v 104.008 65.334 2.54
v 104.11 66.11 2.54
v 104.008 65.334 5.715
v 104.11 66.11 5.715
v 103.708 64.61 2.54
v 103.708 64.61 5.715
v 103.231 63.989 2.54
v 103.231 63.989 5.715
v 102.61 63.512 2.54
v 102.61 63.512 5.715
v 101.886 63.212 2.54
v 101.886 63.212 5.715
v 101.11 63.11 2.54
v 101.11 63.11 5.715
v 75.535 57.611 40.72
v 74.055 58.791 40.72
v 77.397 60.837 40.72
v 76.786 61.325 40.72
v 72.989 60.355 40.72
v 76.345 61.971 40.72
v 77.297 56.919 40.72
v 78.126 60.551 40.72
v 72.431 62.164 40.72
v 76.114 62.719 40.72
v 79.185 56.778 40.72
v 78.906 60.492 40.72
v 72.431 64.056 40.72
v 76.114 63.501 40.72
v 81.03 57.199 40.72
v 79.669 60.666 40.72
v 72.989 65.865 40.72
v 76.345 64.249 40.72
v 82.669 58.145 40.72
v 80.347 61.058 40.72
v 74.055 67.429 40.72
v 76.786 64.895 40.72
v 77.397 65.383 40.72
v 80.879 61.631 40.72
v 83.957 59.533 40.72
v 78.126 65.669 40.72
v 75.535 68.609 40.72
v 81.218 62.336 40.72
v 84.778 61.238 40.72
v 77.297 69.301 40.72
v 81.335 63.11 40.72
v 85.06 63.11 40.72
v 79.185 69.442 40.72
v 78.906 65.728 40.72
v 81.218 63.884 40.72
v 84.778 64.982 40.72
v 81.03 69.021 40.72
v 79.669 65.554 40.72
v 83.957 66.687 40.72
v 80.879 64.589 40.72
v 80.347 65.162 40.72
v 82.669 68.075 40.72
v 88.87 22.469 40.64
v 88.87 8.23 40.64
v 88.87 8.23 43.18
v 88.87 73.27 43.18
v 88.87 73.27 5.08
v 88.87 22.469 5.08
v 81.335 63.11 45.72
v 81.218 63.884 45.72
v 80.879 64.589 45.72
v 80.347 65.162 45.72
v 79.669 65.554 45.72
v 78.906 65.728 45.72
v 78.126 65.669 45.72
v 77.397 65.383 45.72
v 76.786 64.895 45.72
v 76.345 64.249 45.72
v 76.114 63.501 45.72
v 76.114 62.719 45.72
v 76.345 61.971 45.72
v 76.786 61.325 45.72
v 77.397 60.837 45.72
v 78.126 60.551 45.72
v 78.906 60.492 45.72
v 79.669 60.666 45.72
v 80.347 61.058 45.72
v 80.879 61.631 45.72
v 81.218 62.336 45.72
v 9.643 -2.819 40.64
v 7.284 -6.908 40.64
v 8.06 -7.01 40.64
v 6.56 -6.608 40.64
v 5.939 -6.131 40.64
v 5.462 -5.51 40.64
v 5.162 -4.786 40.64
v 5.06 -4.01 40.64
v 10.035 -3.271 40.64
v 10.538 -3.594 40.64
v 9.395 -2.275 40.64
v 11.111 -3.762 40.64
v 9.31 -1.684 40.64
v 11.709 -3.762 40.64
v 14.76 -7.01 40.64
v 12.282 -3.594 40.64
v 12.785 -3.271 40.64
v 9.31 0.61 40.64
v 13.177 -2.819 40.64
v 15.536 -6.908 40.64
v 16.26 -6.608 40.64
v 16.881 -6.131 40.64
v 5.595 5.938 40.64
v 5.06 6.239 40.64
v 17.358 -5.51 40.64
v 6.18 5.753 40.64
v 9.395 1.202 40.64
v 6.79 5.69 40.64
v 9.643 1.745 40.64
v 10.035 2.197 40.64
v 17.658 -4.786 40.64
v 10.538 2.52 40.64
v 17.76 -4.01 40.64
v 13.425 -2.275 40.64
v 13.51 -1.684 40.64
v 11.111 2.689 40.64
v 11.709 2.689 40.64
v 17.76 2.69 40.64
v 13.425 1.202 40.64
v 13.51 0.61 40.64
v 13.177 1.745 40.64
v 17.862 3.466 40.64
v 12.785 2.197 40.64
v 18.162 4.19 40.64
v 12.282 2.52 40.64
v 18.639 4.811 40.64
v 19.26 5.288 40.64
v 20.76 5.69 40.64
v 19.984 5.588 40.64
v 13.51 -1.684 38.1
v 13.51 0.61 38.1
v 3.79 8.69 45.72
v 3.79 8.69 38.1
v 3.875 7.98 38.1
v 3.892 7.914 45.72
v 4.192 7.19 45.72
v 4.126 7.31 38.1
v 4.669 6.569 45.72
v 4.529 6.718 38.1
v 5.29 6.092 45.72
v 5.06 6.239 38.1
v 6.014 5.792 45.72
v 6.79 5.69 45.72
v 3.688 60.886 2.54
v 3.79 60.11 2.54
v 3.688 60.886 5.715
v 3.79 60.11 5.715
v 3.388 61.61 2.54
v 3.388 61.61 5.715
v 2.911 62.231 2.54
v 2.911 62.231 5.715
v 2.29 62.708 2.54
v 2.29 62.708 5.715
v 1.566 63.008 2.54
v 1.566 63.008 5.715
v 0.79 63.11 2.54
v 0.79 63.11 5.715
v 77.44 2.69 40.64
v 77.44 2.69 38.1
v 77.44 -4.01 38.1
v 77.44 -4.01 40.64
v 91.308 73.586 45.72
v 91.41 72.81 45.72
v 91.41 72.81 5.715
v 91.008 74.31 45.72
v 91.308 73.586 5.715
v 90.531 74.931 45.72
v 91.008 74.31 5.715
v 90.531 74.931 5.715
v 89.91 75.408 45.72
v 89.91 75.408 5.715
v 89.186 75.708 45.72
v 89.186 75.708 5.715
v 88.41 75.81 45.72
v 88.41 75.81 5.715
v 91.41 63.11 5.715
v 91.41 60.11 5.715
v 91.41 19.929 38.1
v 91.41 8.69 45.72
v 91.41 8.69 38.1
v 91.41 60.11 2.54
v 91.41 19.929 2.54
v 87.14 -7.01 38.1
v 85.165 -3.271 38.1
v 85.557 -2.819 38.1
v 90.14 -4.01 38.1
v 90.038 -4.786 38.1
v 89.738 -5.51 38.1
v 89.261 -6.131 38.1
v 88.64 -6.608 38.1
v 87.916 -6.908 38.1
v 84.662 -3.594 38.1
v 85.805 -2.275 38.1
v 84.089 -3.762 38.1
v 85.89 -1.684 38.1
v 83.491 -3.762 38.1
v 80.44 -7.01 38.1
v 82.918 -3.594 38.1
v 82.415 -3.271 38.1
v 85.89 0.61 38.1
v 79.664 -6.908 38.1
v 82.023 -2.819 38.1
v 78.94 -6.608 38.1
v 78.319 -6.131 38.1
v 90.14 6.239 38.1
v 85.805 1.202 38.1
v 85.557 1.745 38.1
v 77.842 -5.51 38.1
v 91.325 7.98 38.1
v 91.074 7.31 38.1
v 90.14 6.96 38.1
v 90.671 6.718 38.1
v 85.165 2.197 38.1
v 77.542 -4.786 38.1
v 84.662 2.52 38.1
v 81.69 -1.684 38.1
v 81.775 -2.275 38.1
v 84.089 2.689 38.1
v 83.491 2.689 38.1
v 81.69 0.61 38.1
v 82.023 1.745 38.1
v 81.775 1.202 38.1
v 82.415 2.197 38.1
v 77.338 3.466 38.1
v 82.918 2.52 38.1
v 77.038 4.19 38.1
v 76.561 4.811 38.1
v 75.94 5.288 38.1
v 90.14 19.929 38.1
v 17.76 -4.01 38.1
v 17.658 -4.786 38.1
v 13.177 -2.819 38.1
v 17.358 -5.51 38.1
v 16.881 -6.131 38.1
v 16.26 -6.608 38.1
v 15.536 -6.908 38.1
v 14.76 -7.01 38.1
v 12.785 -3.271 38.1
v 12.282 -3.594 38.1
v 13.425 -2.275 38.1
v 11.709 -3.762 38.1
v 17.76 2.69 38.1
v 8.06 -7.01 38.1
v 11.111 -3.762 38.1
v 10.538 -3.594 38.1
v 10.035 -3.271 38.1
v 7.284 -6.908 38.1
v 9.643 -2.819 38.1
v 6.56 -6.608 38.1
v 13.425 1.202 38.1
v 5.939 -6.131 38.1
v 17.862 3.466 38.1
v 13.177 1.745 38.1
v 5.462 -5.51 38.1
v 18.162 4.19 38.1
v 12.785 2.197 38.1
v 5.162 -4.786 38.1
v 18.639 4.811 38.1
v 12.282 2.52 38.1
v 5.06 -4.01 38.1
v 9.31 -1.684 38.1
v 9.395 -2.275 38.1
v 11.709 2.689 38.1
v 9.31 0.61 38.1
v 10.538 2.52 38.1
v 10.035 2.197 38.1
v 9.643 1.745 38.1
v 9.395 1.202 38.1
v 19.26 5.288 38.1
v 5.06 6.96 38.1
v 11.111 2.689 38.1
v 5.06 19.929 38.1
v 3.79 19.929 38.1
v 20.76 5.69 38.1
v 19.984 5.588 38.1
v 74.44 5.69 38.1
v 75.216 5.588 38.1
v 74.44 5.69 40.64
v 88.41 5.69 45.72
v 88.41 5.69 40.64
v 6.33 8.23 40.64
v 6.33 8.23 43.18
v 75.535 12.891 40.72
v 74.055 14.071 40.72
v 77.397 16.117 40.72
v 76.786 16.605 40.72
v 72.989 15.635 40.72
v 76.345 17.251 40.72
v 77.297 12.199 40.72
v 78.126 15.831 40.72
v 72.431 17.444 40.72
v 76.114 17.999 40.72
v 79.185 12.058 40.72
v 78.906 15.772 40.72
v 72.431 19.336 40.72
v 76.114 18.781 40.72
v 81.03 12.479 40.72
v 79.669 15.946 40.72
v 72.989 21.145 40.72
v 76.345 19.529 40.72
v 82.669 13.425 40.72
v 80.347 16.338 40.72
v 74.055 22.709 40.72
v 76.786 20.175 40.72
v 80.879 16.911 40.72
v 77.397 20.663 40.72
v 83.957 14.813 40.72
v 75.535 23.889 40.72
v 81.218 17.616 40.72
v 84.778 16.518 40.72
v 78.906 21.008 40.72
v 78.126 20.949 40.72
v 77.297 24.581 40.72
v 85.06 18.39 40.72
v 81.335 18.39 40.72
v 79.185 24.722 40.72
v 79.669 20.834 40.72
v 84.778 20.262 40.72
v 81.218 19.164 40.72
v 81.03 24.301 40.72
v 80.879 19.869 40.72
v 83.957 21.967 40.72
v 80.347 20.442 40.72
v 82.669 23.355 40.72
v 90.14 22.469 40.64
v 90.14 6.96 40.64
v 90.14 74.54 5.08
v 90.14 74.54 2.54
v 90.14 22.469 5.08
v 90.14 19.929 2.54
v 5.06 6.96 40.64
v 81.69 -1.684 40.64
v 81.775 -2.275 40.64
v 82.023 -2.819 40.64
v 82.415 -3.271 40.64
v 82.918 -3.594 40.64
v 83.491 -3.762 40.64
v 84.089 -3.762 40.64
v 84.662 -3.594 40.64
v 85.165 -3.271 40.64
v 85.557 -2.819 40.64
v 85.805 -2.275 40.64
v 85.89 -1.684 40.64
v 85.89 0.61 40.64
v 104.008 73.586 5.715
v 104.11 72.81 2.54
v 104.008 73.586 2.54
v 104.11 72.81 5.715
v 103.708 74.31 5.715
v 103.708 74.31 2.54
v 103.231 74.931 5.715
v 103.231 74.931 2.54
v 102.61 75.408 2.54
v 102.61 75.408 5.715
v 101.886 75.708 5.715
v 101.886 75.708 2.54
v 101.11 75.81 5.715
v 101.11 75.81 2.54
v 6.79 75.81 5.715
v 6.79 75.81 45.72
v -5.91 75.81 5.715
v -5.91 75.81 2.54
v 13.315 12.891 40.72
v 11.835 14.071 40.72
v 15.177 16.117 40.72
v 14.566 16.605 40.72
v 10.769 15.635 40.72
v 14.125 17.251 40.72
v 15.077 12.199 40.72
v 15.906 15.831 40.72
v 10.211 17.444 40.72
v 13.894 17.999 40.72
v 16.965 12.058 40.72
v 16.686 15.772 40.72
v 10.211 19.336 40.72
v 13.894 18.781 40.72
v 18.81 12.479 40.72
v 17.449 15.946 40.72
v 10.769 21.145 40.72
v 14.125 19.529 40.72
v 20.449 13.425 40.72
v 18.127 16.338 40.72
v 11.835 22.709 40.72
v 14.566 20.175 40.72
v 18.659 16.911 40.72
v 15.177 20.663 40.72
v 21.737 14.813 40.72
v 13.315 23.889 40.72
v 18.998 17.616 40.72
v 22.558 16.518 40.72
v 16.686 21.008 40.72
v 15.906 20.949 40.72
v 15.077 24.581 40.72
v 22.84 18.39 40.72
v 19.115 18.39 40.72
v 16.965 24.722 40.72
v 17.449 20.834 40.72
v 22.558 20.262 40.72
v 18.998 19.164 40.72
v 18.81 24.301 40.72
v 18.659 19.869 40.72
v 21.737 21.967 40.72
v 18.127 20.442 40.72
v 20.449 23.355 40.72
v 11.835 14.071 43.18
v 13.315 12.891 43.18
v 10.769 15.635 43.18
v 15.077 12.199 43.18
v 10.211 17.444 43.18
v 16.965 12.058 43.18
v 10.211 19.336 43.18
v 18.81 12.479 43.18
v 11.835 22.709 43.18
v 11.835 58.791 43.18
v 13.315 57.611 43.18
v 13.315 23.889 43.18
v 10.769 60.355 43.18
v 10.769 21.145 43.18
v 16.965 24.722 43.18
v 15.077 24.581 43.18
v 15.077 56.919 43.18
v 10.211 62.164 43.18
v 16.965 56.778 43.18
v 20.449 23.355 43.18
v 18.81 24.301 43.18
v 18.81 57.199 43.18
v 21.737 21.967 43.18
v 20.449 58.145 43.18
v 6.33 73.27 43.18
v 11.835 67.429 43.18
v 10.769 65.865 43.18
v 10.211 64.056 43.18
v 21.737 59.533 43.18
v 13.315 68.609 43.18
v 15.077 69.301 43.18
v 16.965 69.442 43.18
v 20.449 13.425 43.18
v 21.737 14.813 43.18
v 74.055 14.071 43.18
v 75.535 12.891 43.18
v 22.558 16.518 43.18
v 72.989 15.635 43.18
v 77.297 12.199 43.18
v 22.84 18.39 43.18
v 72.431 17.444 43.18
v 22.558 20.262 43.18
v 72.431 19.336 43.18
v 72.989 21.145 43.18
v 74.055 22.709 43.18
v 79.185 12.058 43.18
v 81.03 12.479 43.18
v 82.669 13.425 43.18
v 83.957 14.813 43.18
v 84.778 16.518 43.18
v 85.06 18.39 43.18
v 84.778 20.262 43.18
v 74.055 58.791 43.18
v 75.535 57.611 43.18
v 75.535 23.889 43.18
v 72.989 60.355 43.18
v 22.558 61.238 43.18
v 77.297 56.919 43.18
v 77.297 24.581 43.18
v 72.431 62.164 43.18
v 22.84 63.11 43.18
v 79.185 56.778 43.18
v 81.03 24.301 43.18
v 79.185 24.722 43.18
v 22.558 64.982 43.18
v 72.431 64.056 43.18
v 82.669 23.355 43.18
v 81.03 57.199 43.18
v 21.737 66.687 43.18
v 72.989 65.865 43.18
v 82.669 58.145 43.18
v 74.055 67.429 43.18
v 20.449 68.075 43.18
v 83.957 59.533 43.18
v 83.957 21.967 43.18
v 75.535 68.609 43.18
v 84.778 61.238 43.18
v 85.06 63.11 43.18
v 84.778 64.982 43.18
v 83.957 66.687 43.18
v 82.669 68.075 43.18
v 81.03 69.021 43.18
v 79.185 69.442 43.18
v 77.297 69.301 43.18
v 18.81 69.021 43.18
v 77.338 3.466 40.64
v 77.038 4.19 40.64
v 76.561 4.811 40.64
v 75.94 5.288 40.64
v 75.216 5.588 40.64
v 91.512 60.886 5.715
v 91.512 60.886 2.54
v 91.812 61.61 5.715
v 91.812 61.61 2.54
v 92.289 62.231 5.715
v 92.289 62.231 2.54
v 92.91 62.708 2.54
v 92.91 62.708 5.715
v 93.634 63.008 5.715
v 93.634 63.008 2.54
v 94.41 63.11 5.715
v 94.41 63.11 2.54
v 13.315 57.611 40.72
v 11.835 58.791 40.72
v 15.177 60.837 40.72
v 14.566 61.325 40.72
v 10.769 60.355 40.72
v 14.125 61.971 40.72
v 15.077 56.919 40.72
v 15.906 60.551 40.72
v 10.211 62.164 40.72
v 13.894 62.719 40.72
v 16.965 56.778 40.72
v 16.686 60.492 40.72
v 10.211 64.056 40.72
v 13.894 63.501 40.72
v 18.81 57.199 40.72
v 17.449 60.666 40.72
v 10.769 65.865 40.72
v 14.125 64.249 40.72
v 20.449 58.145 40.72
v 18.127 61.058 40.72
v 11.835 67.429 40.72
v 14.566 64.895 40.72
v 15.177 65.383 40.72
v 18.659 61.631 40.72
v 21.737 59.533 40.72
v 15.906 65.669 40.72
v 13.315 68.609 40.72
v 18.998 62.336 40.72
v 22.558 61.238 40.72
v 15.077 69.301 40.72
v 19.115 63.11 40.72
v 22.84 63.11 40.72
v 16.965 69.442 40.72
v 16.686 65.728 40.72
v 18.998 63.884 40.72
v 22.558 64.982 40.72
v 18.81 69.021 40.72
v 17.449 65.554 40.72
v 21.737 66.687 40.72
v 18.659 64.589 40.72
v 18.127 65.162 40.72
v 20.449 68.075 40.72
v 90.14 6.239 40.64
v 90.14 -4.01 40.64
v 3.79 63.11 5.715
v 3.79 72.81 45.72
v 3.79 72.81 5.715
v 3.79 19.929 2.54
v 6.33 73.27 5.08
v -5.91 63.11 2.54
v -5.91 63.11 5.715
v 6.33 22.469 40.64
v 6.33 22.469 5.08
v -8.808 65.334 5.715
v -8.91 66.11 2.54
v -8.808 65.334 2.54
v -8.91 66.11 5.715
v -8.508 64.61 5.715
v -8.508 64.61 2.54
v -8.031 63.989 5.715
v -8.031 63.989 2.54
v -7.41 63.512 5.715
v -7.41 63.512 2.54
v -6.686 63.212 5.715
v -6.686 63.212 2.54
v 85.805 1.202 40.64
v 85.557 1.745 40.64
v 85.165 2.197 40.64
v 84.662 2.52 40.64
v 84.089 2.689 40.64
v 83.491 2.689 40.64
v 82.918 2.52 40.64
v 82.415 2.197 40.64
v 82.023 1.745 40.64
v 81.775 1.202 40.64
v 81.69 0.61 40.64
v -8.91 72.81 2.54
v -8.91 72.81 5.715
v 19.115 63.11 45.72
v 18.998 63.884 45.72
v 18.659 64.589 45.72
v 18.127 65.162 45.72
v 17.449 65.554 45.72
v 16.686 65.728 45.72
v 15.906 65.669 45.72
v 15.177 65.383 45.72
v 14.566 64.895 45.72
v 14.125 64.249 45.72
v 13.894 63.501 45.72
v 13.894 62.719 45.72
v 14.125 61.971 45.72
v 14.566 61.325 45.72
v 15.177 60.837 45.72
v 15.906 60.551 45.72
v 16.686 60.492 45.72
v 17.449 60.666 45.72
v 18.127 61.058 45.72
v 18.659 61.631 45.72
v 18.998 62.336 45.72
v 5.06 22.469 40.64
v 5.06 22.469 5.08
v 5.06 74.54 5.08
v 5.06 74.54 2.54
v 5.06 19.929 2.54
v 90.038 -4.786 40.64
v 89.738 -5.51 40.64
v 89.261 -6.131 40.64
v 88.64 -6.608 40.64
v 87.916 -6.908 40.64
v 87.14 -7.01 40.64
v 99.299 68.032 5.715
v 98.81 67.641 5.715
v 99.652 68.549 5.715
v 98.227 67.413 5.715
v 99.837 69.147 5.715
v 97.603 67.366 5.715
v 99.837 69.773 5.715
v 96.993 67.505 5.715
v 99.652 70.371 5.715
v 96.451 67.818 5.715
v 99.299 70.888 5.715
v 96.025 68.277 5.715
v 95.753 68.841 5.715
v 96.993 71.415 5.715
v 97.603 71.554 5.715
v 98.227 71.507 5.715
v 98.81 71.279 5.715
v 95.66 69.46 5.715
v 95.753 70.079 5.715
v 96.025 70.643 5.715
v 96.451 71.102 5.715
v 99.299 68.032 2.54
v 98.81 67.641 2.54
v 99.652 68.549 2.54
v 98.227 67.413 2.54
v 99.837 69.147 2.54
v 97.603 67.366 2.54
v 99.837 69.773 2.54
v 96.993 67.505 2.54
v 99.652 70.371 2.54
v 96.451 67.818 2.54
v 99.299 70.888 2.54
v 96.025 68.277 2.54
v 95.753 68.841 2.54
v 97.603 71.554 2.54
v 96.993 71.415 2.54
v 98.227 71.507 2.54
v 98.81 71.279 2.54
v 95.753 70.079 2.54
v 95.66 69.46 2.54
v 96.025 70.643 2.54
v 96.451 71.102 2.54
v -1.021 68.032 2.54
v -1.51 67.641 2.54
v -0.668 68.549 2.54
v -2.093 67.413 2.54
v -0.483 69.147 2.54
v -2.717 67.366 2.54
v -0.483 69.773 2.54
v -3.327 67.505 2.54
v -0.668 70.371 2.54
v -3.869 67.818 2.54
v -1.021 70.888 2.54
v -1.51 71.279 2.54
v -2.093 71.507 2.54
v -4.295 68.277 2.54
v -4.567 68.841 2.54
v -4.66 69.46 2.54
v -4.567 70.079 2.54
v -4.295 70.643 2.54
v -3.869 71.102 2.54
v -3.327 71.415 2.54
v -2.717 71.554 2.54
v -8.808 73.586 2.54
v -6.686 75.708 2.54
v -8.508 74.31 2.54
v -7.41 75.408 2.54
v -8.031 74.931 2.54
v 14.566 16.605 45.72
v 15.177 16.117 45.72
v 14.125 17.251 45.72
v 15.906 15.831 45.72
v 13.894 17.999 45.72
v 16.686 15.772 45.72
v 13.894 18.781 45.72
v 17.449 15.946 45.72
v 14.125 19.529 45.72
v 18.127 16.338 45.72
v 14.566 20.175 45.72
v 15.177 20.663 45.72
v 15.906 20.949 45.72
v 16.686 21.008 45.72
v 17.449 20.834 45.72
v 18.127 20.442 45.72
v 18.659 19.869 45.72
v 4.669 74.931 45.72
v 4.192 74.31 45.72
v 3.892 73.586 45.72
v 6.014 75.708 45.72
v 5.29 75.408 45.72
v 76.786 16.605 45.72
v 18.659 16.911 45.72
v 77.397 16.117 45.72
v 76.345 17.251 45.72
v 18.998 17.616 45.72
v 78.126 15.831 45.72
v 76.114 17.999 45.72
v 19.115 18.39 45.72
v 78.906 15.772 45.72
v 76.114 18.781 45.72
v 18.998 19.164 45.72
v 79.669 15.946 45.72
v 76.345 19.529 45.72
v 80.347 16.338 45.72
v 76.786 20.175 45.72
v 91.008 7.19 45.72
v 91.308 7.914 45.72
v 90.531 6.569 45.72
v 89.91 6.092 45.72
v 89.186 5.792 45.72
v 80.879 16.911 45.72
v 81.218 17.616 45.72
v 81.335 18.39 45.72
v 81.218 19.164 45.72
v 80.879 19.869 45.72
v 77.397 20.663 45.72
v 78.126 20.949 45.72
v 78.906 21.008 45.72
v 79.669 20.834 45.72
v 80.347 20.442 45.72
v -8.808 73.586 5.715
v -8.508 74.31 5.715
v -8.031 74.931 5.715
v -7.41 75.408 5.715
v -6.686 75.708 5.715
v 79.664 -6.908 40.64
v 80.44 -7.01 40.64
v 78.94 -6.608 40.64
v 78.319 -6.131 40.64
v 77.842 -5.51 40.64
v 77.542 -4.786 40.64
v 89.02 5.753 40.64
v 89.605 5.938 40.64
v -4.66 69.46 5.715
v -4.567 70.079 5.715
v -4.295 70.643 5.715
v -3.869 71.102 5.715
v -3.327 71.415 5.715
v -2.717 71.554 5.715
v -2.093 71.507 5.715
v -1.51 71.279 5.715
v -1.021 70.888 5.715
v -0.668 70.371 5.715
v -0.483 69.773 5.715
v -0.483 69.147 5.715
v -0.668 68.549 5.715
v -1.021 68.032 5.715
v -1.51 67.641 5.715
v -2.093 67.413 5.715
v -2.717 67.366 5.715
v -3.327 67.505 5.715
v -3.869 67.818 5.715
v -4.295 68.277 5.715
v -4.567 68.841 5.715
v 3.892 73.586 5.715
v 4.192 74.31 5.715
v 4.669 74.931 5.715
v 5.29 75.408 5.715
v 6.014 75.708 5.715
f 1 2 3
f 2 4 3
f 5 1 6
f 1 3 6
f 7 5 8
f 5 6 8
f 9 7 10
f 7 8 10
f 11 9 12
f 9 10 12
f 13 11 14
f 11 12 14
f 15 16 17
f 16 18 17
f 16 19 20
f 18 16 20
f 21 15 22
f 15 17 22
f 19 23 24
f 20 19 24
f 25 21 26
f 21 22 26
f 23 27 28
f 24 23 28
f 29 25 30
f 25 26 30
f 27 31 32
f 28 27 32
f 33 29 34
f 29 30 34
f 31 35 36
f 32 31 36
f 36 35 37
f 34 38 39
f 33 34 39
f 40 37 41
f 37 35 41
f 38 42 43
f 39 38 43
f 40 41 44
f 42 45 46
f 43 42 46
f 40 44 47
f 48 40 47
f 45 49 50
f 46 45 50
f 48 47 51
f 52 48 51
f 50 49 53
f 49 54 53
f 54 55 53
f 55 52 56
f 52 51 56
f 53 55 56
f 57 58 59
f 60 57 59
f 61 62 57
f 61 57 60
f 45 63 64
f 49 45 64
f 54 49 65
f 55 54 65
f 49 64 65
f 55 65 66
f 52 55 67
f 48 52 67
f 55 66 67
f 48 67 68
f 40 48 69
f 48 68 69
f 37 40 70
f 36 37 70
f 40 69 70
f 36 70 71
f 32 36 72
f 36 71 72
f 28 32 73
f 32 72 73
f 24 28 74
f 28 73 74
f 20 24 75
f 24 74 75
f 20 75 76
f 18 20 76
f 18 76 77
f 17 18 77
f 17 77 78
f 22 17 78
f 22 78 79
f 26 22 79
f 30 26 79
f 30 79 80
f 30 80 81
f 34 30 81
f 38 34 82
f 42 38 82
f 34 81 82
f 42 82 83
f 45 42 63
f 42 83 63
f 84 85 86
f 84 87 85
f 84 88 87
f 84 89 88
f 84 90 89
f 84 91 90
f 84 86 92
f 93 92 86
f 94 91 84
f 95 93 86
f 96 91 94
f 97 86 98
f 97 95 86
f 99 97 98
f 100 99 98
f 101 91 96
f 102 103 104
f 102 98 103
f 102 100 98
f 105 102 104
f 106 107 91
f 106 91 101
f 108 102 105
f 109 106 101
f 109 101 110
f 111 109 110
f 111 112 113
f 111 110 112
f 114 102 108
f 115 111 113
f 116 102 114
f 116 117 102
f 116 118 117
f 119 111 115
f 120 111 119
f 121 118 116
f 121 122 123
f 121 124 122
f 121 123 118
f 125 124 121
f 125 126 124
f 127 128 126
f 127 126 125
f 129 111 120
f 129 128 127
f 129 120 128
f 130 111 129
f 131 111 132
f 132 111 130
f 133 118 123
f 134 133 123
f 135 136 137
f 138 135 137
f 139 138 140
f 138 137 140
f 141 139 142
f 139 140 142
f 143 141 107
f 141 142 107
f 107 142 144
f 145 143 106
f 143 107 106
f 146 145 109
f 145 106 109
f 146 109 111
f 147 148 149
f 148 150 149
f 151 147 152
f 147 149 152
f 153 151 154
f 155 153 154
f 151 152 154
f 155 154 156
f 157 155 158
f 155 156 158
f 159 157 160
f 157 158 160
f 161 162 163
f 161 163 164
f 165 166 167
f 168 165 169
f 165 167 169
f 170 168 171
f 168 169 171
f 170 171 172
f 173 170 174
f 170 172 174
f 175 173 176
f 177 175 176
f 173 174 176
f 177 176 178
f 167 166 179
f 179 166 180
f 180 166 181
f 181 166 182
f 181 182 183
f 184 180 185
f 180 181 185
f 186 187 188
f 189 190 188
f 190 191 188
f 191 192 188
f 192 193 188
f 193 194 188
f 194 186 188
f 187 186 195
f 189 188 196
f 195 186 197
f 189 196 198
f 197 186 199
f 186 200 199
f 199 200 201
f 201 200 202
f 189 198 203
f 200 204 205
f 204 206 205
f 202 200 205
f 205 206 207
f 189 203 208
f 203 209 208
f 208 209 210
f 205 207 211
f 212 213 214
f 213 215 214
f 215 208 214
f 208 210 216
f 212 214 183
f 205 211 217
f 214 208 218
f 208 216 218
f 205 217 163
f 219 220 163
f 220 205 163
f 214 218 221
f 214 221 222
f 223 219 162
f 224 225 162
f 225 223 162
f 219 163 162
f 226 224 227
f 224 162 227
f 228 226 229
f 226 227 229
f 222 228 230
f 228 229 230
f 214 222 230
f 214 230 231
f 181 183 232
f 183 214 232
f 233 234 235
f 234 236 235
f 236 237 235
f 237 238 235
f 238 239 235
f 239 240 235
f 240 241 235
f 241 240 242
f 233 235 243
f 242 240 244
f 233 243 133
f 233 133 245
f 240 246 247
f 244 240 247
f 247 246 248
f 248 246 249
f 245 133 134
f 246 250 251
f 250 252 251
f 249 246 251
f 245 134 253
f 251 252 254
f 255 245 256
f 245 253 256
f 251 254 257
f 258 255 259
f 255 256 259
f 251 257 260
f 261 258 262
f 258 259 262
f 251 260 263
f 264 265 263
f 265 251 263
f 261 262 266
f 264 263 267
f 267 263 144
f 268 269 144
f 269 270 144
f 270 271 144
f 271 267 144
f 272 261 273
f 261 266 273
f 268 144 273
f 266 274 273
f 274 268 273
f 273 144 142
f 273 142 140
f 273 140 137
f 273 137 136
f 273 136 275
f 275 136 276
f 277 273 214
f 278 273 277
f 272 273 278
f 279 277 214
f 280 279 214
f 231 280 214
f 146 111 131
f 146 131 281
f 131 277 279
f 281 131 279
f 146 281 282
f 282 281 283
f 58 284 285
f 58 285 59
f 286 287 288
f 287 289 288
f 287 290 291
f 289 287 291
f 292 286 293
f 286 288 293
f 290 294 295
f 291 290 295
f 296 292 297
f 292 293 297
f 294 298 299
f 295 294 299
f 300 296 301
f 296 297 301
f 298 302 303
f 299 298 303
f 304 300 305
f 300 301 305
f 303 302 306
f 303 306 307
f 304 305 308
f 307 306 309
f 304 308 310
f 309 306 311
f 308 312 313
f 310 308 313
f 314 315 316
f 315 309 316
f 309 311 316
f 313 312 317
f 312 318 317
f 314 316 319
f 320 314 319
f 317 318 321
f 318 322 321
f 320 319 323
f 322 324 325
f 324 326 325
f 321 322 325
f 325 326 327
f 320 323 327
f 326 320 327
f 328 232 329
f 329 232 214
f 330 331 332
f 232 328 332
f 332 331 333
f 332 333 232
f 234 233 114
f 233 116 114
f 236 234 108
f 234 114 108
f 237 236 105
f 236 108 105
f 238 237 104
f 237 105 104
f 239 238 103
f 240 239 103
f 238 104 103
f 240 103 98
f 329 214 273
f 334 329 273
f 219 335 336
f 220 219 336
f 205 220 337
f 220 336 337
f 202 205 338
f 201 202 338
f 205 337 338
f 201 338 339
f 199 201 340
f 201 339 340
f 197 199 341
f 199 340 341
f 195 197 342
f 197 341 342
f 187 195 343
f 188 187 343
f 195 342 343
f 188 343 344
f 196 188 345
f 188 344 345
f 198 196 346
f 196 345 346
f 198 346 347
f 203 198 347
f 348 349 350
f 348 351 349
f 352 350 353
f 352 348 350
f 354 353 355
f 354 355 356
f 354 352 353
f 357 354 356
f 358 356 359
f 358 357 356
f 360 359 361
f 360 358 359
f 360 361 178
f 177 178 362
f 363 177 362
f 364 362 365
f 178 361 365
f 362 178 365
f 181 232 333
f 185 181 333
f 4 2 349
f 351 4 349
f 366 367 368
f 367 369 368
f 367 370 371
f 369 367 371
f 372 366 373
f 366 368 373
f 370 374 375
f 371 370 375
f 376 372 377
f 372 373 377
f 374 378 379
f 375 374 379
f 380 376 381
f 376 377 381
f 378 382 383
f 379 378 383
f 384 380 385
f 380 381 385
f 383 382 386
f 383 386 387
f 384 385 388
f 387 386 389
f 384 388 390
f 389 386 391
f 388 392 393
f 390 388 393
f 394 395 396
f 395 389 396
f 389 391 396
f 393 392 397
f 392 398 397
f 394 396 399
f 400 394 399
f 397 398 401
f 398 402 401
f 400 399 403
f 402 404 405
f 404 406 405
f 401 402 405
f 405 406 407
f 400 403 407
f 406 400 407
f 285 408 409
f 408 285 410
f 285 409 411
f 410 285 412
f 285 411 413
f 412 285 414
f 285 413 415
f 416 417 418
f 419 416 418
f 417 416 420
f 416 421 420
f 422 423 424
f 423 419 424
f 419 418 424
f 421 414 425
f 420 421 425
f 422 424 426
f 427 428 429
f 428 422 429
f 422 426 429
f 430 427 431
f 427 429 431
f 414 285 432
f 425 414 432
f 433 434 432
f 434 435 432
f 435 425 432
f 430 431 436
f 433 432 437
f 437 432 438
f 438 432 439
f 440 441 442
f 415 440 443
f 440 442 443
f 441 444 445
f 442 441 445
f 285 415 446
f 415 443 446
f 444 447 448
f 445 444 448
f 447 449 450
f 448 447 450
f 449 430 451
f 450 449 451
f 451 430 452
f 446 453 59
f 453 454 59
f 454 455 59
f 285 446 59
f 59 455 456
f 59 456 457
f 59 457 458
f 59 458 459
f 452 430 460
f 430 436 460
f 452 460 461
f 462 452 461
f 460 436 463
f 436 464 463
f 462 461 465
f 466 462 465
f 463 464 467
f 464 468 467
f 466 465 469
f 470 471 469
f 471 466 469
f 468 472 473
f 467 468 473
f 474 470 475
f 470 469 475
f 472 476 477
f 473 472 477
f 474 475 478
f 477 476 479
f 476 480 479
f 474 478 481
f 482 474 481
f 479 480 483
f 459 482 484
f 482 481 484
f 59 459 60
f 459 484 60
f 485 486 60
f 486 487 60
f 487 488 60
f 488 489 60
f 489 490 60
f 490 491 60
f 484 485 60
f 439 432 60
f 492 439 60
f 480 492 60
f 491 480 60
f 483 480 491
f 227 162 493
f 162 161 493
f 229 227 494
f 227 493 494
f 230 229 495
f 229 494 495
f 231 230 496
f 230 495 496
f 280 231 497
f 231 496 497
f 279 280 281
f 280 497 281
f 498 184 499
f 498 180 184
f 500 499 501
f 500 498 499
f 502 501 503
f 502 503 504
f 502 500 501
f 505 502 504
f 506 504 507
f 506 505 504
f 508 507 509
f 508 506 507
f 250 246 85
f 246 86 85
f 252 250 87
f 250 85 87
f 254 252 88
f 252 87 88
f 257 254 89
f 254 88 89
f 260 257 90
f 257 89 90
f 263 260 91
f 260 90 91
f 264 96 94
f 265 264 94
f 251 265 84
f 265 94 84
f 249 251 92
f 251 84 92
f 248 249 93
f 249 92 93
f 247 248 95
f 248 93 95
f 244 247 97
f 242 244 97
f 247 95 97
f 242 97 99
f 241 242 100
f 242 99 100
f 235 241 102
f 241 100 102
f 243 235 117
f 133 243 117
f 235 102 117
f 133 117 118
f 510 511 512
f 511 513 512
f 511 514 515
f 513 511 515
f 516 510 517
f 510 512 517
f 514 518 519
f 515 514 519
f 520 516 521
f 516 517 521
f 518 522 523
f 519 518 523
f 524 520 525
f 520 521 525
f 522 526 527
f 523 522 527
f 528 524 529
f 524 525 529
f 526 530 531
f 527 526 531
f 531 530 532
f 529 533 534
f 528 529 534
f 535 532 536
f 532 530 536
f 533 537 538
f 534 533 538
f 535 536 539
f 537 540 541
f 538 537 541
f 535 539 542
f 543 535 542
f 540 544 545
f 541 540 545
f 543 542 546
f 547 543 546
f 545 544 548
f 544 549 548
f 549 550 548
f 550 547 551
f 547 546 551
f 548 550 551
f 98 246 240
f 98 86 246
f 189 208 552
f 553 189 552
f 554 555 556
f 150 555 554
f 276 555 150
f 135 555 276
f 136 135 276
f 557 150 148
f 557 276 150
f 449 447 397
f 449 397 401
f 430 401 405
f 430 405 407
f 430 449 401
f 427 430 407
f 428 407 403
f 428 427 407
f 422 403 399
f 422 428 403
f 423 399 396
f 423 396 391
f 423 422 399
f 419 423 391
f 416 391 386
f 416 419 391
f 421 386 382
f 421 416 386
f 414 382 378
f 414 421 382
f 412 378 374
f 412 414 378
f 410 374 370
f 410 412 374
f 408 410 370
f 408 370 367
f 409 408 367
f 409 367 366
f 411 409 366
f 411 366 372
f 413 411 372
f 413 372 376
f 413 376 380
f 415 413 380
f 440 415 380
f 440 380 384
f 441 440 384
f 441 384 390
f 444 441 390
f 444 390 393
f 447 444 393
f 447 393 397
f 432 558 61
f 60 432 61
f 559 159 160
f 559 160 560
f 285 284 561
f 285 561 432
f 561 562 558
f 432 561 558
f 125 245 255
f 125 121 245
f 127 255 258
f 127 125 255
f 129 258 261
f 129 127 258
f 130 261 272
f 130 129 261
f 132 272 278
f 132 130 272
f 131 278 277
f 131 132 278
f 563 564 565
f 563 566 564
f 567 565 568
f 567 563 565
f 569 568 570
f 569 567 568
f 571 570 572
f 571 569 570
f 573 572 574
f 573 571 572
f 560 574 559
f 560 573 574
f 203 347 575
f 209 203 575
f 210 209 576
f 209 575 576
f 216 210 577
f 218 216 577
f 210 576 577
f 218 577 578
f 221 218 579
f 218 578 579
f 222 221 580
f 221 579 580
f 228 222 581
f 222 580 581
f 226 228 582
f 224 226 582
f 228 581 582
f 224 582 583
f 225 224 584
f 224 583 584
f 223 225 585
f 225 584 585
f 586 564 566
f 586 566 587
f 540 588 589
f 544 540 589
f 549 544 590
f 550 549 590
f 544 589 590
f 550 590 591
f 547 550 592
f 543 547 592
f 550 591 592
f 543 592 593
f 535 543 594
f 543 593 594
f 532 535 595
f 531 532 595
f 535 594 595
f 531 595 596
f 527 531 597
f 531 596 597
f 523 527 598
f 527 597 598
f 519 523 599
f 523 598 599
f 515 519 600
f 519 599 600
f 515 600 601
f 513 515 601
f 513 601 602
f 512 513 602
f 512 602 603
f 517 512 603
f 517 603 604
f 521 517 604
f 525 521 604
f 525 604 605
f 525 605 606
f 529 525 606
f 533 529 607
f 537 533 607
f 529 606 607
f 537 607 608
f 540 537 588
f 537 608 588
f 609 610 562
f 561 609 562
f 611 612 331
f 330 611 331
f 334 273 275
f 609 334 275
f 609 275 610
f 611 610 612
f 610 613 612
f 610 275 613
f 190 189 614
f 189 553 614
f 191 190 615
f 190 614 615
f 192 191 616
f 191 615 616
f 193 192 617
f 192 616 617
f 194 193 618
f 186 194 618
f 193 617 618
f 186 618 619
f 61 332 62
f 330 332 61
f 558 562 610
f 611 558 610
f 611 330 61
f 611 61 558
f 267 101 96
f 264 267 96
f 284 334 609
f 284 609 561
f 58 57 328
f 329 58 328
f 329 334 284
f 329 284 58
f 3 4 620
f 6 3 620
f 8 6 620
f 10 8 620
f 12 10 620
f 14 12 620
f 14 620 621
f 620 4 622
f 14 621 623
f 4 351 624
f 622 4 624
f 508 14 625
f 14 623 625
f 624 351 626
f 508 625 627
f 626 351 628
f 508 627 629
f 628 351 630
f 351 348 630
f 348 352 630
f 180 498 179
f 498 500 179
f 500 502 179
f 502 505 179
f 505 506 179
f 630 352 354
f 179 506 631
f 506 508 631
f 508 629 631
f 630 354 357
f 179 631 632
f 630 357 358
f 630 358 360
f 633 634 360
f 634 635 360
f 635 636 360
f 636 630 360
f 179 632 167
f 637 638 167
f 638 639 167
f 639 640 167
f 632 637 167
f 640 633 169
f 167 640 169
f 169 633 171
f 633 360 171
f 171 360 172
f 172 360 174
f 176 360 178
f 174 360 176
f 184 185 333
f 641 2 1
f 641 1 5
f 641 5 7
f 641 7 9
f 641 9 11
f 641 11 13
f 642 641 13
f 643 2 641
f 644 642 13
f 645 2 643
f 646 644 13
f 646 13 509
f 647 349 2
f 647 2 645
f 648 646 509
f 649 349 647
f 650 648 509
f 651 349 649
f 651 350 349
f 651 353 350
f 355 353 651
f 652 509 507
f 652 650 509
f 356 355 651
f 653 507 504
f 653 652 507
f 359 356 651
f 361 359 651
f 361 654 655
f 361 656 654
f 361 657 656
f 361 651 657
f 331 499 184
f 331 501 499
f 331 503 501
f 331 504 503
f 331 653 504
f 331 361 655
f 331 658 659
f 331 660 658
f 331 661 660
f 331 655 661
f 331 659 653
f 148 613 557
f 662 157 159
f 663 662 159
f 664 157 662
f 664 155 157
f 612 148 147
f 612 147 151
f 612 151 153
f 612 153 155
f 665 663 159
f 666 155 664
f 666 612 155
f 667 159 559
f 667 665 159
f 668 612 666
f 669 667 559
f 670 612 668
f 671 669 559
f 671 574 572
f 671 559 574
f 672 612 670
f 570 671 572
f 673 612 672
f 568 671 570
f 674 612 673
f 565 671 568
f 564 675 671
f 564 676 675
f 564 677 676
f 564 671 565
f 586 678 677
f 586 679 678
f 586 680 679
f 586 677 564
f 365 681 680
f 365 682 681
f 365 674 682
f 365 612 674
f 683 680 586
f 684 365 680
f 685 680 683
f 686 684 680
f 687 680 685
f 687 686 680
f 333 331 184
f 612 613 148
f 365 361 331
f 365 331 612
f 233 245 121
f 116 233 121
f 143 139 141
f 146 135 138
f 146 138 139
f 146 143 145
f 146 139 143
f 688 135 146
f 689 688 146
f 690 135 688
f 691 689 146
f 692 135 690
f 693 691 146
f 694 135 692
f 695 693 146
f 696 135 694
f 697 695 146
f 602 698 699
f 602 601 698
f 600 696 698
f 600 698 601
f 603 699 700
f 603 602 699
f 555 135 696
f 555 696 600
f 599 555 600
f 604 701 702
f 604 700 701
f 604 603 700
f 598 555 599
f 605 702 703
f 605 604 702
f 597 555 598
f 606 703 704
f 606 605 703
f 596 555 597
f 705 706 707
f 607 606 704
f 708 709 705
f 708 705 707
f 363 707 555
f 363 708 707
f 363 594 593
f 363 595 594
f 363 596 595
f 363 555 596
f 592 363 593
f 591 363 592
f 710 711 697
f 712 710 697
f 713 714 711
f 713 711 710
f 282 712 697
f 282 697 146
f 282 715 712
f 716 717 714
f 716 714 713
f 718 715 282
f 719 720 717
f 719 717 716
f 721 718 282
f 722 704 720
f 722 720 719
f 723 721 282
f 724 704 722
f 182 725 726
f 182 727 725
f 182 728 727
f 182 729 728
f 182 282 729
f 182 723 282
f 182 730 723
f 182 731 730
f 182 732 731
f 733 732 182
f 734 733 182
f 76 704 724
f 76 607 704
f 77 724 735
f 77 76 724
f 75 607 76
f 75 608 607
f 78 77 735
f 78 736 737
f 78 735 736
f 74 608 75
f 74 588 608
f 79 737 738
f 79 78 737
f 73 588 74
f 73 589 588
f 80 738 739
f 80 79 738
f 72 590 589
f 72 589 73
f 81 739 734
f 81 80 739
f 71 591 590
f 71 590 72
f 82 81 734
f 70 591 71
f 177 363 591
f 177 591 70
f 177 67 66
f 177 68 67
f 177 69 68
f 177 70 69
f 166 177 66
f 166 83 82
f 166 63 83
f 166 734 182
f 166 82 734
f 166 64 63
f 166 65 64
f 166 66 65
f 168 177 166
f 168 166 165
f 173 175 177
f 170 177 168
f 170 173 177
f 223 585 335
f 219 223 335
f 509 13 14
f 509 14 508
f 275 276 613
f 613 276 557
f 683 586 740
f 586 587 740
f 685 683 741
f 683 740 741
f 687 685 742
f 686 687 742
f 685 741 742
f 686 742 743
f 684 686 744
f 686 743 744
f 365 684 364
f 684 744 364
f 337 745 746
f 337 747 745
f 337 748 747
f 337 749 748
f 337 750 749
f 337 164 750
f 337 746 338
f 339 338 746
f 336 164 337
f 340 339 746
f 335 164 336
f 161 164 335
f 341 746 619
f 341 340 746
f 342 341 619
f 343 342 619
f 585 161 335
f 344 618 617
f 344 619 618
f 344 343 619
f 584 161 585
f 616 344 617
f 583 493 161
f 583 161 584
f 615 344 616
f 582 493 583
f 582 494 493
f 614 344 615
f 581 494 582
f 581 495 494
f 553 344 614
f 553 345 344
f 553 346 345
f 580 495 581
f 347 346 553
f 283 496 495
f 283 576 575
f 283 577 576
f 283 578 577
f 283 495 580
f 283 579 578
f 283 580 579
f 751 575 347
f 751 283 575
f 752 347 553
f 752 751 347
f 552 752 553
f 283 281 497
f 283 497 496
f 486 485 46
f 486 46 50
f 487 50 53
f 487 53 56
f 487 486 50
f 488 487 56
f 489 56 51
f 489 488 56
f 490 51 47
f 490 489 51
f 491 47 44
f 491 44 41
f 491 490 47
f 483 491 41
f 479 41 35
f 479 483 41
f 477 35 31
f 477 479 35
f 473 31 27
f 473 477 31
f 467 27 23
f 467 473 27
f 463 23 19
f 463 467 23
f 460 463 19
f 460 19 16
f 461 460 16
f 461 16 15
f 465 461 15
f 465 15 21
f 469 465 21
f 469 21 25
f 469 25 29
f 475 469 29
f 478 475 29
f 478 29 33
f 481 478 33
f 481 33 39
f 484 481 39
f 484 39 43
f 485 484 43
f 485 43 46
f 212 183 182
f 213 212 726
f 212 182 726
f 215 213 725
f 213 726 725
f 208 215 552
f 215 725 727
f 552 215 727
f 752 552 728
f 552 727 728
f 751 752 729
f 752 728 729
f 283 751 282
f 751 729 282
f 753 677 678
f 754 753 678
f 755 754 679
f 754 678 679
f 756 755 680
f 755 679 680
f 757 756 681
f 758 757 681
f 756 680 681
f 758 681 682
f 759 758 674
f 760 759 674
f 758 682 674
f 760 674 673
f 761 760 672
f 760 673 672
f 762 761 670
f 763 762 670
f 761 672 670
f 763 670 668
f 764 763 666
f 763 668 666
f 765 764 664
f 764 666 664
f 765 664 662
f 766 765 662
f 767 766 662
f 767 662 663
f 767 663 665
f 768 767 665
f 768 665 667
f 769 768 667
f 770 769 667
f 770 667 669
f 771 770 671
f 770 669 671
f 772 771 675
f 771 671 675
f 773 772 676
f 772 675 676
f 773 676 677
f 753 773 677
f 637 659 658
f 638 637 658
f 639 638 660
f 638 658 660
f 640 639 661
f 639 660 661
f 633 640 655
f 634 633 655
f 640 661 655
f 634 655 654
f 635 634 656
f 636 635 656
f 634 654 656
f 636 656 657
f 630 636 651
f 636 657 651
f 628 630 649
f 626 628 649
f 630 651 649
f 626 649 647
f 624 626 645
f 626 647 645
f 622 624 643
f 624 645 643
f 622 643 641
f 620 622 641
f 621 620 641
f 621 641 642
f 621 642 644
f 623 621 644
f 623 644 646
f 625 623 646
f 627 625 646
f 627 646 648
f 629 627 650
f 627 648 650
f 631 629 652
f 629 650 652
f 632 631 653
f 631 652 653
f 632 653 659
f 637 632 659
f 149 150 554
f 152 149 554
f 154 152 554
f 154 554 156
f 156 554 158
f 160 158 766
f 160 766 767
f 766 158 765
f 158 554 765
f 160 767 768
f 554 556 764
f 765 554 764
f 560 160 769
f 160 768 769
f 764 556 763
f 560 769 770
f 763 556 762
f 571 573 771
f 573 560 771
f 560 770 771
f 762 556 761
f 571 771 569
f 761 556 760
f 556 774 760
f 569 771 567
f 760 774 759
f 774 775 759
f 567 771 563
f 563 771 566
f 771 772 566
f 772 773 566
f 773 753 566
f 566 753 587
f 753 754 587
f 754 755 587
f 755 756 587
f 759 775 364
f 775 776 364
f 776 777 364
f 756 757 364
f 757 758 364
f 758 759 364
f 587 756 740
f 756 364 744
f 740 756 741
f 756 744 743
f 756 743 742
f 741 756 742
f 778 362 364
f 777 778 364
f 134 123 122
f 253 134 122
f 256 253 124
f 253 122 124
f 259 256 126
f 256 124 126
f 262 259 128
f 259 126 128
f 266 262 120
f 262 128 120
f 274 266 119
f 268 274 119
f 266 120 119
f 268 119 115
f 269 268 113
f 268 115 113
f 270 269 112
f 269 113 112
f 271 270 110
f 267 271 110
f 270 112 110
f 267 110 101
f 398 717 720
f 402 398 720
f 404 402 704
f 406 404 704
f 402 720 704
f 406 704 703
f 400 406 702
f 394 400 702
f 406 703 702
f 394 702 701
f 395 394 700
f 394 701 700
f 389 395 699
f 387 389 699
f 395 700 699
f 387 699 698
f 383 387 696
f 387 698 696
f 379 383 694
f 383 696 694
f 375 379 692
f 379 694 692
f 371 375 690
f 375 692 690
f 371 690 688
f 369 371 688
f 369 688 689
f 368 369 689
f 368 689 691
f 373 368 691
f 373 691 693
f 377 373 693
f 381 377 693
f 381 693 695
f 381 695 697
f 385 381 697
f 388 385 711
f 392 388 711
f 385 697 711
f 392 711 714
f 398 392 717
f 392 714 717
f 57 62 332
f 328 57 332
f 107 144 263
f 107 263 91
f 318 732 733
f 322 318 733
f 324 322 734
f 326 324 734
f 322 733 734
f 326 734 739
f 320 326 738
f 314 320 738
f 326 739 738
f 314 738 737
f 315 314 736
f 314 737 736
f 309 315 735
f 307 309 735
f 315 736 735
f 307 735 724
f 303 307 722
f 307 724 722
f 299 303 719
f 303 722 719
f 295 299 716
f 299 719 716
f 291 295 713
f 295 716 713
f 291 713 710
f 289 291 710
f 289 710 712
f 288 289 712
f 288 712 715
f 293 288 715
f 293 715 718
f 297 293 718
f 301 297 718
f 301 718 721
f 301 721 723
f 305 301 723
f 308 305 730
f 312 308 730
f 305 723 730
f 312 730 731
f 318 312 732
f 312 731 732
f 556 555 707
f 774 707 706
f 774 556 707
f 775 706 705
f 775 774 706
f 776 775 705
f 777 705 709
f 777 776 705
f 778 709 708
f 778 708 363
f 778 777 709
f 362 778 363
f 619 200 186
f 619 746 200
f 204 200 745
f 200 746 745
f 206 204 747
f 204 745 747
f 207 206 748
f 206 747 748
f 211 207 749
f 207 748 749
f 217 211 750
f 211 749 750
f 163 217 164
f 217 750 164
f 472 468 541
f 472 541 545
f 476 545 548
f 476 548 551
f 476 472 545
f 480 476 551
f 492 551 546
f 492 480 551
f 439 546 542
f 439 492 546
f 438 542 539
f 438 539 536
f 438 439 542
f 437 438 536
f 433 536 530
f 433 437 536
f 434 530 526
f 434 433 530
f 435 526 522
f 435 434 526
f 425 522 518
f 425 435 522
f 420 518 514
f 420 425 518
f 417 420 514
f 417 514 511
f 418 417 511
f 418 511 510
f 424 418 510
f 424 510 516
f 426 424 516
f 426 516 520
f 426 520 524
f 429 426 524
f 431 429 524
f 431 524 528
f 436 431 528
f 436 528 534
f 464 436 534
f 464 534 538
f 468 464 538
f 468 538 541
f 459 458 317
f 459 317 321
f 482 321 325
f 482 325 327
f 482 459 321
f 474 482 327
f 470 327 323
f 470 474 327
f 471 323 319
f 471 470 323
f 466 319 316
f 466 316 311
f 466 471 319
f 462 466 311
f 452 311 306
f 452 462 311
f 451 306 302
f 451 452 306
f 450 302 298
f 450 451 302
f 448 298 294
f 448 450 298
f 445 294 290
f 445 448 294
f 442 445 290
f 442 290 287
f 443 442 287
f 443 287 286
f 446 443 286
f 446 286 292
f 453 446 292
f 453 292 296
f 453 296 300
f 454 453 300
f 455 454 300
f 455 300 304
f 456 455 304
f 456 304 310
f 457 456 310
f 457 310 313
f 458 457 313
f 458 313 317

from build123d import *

# Parameters (mm, degrees)
SKETCH1_W           = 82.539998569
SKETCH1_H           = 65.04
BOSS_EXTRUDE1_DEPTH = 43.18
SHELL1_T            = 2.54
CUT_EXTRUDE2_DEPTH  = 124.028758627
SKETCH7_W           = 87.619998569
SKETCH7_H           = 43.18
BOSS_EXTRUDE2_DEPTH = 2.54
CUT_EXTRUDE3_DEPTH  = 2.54
CUT_EXTRUDE4_DEPTH  = 2.54
SKETCH10_W          = 1.27
SKETCH10_H          = 35.56
CUT_EXTRUDE5_DEPTH  = 2.54
SKETCH11_W          = 12.7
SKETCH11_H          = 2.54
BOSS_EXTRUDE3_DEPTH = 12.7
CUT_EXTRUDE7_DEPTH  = 125.717897357
SKETCH13_W          = 12.7
SKETCH13_H          = 12.7
SKETCH13_R          = 2.1
BOSS_EXTRUDE4_DEPTH = 3.175
FILLET2_R           = 3
SKETCH14_R          = 6.35
BOSS_EXTRUDE5_DEPTH = 5
SKETCH15_R          = 2.625
CUT_EXTRUDE8_DEPTH  = 5


with BuildPart() as part:
    # Sketch1 → Boss-Extrude1 (new body)
    with BuildSketch(Plane.XY):
        with Locations((47.599999189, 40.75)):
            Rectangle(SKETCH1_W, SKETCH1_H)
    extrude(amount=BOSS_EXTRUDE1_DEPTH)

    # Shell1
    shell1_openings = [part.faces().sort_by_distance(p)[0] for p in [
        (47.599999189, 73.27, 21.59),
        (47.599999189, 40.75, 0),
    ]]
    offset(amount=SHELL1_T, openings=shell1_openings, kind=Kind.INTERSECTION)

    # Sketch6 → Cut-Extrude2 (cut, through all)
    with BuildSketch(Plane.ZY.offset(-3.789999905)):
        Polygon((2.54, 59.03), (2.54, 73.27), (0, 73.27), (0, 59.03), (0, 3.15), (38.1, 3.15), (38.1, 19.92924), (2.54, 19.92924), align=None)
    extrude(amount=-CUT_EXTRUDE2_DEPTH, mode=Mode.SUBTRACT)

    # Sketch7 → Boss-Extrude2 (add)
    with BuildSketch(Plane(origin=(0, 73.27, 0), x_dir=(1, 0, 0), z_dir=(0, 1, 0))):
        with Locations((47.59999919, -24.13)):
            Rectangle(SKETCH7_W, SKETCH7_H)
    extrude(amount=BOSS_EXTRUDE2_DEPTH)

    # Sketch8 → Cut-Extrude3 (cut)
    with BuildSketch(Plane(origin=(0, 0, 2.54), x_dir=(-1, 0, 0), z_dir=(0, 0, -1))):
        Polygon((-65.405564728, 73.27), (-65.405564728, 74.54), (-90.139998474, 74.54), (-90.139998474, 19.92924), (-88.869998474, 19.92924), (-88.869998474, 73.27), align=None)
        Polygon((-5.059999905, 74.54), (-65.405564728, 74.54), (-65.405564728, 73.27), (-6.329999905, 73.27), (-6.329999905, 19.92924), (-5.059999905, 19.92924), align=None)
    extrude(amount=-CUT_EXTRUDE3_DEPTH, mode=Mode.SUBTRACT)

    # Sketch9 → Cut-Extrude4 (cut)
    with BuildSketch(Plane(origin=(0, 0, 38.1), x_dir=(-1, 0, 0), z_dir=(0, 0, -1))):
        Polygon((-90.139998474, 19.92924), (-90.139998474, 6.96), (-5.059999905, 6.96), (-5.059999905, 19.92924), (-6.329999905, 19.92924), (-6.329999905, 8.23), (-88.869998474, 8.23), (-88.869998474, 19.92924), align=None)
    extrude(amount=-CUT_EXTRUDE4_DEPTH, mode=Mode.SUBTRACT)

    # Sketch10 → Cut-Extrude5 (cut)
    with BuildSketch(Plane.XZ.offset(-19.92924)):
        with Locations((5.694999905, 22.86)):
            Rectangle(SKETCH10_W, SKETCH10_H)
        with Locations((89.504998474, 22.86)):
            Rectangle(SKETCH10_W, SKETCH10_H)
    extrude(amount=-CUT_EXTRUDE5_DEPTH, mode=Mode.SUBTRACT)

    # Sketch11 → Boss-Extrude3 (add)
    with BuildSketch(Plane.XZ.offset(-5.69)):
        with Locations((11.409999905, 39.37)):
            Rectangle(SKETCH11_W, SKETCH11_H)
        with Locations((83.789998474, 39.37)):
            Rectangle(SKETCH11_W, SKETCH11_H)
    extrude(amount=BOSS_EXTRUDE3_DEPTH)

    # Sketch12 → Cut-Extrude7 (cut, through all)
    with BuildSketch(Plane.XY.offset(40.64)):
        with BuildLine():
            Line((9.309999905, 0.61), (9.309999905, -1.683510845))
            ThreePointArc((9.309999905, -1.683510845), (11.409999905, -3.783510845), (13.509999905, -1.683510845))
            Line((13.509999905, -1.683510845), (13.509999905, 0.61))
            ThreePointArc((13.509999905, 0.61), (11.409999905, 2.71), (9.309999905, 0.61))
        make_face()
        with BuildLine():
            Line((81.689998474, 0.61), (81.689998474, -1.683510845))
            ThreePointArc((81.689998474, -1.683510845), (83.789998474, -3.783510845), (85.889998474, -1.683510845))
            Line((85.889998474, -1.683510845), (85.889998474, 0.61))
            ThreePointArc((85.889998474, 0.61), (83.789998474, 2.71), (81.689998474, 0.61))
        make_face()
    extrude(amount=-CUT_EXTRUDE7_DEPTH, mode=Mode.SUBTRACT)

    # Sketch13 → Boss-Extrude4 (add)
    # profile 1 of 2: a face of its own
    with BuildSketch(Plane(origin=(0, 0, 2.54), x_dir=(-1, 0, 0), z_dir=(0, 0, -1))):
        with Locations((-97.759998474, 69.46)):
            Rectangle(SKETCH13_W, SKETCH13_H)
        with Locations((-97.759998474, 69.46)):
            Circle(SKETCH13_R, mode=Mode.SUBTRACT)
    # profile 2 of 2: a face of its own
    with BuildSketch(Plane(origin=(0, 0, 2.54), x_dir=(-1, 0, 0), z_dir=(0, 0, -1))):
        with Locations((2.560000095, 69.46)):
            Rectangle(SKETCH13_W, SKETCH13_H)
        with Locations((2.560000095, 69.46)):
            Circle(SKETCH13_R, mode=Mode.SUBTRACT)
    extrude(amount=-BOSS_EXTRUDE4_DEPTH)

    # Fillet2
    fillet2_edges = [part.edges().sort_by_distance(p)[0] for p in [
        (77.439998474, 5.69, 39.37),
        (77.439998474, -7.01, 39.37),
        (90.139998474, -7.01, 39.37),
        (17.759999905, -7.01, 39.37),
        (5.059999905, -7.01, 39.37),
        (17.759999905, 5.69, 39.37),
        (3.789999905, 63.11, 4.1275),
        (-8.910000095, 63.11, 4.1275),
        (-8.910000095, 75.81, 4.1275),
        (104.109998474, 63.11, 4.1275),
        (91.409998474, 63.11, 4.1275),
        (104.109998474, 75.81, 4.1275),
        (91.409998474, 75.81, 25.7175),
        (3.789999905, 75.81, 25.7175),
        (3.789999905, 5.69, 41.91),
        (91.409998474, 5.69, 41.91),
    ]]
    fillet(fillet2_edges, radius=FILLET2_R)

    # Sketch14 → Boss-Extrude5 (add)
    with BuildSketch(Plane.XY.offset(45.72)):
        with Locations((16.489999905, 63.11)):
            Circle(SKETCH14_R)
        with Locations((16.489999905, 18.39)):
            Circle(SKETCH14_R)
        with Locations((78.709998474, 18.39)):
            Circle(SKETCH14_R)
        with Locations((78.709998474, 63.11)):
            Circle(SKETCH14_R)
    extrude(amount=-BOSS_EXTRUDE5_DEPTH)

    # Sketch15 → Cut-Extrude8 (cut)
    with BuildSketch(Plane.XY.offset(45.72)):
        with Locations((16.489999905, 63.11)):
            Circle(SKETCH15_R)
        with Locations((78.709998474, 63.11)):
            Circle(SKETCH15_R)
        with Locations((16.489999905, 18.39)):
            Circle(SKETCH15_R)
        with Locations((78.709998474, 18.39)):
            Circle(SKETCH15_R)
    extrude(amount=-CUT_EXTRUDE8_DEPTH, mode=Mode.SUBTRACT)


solid = part.part
